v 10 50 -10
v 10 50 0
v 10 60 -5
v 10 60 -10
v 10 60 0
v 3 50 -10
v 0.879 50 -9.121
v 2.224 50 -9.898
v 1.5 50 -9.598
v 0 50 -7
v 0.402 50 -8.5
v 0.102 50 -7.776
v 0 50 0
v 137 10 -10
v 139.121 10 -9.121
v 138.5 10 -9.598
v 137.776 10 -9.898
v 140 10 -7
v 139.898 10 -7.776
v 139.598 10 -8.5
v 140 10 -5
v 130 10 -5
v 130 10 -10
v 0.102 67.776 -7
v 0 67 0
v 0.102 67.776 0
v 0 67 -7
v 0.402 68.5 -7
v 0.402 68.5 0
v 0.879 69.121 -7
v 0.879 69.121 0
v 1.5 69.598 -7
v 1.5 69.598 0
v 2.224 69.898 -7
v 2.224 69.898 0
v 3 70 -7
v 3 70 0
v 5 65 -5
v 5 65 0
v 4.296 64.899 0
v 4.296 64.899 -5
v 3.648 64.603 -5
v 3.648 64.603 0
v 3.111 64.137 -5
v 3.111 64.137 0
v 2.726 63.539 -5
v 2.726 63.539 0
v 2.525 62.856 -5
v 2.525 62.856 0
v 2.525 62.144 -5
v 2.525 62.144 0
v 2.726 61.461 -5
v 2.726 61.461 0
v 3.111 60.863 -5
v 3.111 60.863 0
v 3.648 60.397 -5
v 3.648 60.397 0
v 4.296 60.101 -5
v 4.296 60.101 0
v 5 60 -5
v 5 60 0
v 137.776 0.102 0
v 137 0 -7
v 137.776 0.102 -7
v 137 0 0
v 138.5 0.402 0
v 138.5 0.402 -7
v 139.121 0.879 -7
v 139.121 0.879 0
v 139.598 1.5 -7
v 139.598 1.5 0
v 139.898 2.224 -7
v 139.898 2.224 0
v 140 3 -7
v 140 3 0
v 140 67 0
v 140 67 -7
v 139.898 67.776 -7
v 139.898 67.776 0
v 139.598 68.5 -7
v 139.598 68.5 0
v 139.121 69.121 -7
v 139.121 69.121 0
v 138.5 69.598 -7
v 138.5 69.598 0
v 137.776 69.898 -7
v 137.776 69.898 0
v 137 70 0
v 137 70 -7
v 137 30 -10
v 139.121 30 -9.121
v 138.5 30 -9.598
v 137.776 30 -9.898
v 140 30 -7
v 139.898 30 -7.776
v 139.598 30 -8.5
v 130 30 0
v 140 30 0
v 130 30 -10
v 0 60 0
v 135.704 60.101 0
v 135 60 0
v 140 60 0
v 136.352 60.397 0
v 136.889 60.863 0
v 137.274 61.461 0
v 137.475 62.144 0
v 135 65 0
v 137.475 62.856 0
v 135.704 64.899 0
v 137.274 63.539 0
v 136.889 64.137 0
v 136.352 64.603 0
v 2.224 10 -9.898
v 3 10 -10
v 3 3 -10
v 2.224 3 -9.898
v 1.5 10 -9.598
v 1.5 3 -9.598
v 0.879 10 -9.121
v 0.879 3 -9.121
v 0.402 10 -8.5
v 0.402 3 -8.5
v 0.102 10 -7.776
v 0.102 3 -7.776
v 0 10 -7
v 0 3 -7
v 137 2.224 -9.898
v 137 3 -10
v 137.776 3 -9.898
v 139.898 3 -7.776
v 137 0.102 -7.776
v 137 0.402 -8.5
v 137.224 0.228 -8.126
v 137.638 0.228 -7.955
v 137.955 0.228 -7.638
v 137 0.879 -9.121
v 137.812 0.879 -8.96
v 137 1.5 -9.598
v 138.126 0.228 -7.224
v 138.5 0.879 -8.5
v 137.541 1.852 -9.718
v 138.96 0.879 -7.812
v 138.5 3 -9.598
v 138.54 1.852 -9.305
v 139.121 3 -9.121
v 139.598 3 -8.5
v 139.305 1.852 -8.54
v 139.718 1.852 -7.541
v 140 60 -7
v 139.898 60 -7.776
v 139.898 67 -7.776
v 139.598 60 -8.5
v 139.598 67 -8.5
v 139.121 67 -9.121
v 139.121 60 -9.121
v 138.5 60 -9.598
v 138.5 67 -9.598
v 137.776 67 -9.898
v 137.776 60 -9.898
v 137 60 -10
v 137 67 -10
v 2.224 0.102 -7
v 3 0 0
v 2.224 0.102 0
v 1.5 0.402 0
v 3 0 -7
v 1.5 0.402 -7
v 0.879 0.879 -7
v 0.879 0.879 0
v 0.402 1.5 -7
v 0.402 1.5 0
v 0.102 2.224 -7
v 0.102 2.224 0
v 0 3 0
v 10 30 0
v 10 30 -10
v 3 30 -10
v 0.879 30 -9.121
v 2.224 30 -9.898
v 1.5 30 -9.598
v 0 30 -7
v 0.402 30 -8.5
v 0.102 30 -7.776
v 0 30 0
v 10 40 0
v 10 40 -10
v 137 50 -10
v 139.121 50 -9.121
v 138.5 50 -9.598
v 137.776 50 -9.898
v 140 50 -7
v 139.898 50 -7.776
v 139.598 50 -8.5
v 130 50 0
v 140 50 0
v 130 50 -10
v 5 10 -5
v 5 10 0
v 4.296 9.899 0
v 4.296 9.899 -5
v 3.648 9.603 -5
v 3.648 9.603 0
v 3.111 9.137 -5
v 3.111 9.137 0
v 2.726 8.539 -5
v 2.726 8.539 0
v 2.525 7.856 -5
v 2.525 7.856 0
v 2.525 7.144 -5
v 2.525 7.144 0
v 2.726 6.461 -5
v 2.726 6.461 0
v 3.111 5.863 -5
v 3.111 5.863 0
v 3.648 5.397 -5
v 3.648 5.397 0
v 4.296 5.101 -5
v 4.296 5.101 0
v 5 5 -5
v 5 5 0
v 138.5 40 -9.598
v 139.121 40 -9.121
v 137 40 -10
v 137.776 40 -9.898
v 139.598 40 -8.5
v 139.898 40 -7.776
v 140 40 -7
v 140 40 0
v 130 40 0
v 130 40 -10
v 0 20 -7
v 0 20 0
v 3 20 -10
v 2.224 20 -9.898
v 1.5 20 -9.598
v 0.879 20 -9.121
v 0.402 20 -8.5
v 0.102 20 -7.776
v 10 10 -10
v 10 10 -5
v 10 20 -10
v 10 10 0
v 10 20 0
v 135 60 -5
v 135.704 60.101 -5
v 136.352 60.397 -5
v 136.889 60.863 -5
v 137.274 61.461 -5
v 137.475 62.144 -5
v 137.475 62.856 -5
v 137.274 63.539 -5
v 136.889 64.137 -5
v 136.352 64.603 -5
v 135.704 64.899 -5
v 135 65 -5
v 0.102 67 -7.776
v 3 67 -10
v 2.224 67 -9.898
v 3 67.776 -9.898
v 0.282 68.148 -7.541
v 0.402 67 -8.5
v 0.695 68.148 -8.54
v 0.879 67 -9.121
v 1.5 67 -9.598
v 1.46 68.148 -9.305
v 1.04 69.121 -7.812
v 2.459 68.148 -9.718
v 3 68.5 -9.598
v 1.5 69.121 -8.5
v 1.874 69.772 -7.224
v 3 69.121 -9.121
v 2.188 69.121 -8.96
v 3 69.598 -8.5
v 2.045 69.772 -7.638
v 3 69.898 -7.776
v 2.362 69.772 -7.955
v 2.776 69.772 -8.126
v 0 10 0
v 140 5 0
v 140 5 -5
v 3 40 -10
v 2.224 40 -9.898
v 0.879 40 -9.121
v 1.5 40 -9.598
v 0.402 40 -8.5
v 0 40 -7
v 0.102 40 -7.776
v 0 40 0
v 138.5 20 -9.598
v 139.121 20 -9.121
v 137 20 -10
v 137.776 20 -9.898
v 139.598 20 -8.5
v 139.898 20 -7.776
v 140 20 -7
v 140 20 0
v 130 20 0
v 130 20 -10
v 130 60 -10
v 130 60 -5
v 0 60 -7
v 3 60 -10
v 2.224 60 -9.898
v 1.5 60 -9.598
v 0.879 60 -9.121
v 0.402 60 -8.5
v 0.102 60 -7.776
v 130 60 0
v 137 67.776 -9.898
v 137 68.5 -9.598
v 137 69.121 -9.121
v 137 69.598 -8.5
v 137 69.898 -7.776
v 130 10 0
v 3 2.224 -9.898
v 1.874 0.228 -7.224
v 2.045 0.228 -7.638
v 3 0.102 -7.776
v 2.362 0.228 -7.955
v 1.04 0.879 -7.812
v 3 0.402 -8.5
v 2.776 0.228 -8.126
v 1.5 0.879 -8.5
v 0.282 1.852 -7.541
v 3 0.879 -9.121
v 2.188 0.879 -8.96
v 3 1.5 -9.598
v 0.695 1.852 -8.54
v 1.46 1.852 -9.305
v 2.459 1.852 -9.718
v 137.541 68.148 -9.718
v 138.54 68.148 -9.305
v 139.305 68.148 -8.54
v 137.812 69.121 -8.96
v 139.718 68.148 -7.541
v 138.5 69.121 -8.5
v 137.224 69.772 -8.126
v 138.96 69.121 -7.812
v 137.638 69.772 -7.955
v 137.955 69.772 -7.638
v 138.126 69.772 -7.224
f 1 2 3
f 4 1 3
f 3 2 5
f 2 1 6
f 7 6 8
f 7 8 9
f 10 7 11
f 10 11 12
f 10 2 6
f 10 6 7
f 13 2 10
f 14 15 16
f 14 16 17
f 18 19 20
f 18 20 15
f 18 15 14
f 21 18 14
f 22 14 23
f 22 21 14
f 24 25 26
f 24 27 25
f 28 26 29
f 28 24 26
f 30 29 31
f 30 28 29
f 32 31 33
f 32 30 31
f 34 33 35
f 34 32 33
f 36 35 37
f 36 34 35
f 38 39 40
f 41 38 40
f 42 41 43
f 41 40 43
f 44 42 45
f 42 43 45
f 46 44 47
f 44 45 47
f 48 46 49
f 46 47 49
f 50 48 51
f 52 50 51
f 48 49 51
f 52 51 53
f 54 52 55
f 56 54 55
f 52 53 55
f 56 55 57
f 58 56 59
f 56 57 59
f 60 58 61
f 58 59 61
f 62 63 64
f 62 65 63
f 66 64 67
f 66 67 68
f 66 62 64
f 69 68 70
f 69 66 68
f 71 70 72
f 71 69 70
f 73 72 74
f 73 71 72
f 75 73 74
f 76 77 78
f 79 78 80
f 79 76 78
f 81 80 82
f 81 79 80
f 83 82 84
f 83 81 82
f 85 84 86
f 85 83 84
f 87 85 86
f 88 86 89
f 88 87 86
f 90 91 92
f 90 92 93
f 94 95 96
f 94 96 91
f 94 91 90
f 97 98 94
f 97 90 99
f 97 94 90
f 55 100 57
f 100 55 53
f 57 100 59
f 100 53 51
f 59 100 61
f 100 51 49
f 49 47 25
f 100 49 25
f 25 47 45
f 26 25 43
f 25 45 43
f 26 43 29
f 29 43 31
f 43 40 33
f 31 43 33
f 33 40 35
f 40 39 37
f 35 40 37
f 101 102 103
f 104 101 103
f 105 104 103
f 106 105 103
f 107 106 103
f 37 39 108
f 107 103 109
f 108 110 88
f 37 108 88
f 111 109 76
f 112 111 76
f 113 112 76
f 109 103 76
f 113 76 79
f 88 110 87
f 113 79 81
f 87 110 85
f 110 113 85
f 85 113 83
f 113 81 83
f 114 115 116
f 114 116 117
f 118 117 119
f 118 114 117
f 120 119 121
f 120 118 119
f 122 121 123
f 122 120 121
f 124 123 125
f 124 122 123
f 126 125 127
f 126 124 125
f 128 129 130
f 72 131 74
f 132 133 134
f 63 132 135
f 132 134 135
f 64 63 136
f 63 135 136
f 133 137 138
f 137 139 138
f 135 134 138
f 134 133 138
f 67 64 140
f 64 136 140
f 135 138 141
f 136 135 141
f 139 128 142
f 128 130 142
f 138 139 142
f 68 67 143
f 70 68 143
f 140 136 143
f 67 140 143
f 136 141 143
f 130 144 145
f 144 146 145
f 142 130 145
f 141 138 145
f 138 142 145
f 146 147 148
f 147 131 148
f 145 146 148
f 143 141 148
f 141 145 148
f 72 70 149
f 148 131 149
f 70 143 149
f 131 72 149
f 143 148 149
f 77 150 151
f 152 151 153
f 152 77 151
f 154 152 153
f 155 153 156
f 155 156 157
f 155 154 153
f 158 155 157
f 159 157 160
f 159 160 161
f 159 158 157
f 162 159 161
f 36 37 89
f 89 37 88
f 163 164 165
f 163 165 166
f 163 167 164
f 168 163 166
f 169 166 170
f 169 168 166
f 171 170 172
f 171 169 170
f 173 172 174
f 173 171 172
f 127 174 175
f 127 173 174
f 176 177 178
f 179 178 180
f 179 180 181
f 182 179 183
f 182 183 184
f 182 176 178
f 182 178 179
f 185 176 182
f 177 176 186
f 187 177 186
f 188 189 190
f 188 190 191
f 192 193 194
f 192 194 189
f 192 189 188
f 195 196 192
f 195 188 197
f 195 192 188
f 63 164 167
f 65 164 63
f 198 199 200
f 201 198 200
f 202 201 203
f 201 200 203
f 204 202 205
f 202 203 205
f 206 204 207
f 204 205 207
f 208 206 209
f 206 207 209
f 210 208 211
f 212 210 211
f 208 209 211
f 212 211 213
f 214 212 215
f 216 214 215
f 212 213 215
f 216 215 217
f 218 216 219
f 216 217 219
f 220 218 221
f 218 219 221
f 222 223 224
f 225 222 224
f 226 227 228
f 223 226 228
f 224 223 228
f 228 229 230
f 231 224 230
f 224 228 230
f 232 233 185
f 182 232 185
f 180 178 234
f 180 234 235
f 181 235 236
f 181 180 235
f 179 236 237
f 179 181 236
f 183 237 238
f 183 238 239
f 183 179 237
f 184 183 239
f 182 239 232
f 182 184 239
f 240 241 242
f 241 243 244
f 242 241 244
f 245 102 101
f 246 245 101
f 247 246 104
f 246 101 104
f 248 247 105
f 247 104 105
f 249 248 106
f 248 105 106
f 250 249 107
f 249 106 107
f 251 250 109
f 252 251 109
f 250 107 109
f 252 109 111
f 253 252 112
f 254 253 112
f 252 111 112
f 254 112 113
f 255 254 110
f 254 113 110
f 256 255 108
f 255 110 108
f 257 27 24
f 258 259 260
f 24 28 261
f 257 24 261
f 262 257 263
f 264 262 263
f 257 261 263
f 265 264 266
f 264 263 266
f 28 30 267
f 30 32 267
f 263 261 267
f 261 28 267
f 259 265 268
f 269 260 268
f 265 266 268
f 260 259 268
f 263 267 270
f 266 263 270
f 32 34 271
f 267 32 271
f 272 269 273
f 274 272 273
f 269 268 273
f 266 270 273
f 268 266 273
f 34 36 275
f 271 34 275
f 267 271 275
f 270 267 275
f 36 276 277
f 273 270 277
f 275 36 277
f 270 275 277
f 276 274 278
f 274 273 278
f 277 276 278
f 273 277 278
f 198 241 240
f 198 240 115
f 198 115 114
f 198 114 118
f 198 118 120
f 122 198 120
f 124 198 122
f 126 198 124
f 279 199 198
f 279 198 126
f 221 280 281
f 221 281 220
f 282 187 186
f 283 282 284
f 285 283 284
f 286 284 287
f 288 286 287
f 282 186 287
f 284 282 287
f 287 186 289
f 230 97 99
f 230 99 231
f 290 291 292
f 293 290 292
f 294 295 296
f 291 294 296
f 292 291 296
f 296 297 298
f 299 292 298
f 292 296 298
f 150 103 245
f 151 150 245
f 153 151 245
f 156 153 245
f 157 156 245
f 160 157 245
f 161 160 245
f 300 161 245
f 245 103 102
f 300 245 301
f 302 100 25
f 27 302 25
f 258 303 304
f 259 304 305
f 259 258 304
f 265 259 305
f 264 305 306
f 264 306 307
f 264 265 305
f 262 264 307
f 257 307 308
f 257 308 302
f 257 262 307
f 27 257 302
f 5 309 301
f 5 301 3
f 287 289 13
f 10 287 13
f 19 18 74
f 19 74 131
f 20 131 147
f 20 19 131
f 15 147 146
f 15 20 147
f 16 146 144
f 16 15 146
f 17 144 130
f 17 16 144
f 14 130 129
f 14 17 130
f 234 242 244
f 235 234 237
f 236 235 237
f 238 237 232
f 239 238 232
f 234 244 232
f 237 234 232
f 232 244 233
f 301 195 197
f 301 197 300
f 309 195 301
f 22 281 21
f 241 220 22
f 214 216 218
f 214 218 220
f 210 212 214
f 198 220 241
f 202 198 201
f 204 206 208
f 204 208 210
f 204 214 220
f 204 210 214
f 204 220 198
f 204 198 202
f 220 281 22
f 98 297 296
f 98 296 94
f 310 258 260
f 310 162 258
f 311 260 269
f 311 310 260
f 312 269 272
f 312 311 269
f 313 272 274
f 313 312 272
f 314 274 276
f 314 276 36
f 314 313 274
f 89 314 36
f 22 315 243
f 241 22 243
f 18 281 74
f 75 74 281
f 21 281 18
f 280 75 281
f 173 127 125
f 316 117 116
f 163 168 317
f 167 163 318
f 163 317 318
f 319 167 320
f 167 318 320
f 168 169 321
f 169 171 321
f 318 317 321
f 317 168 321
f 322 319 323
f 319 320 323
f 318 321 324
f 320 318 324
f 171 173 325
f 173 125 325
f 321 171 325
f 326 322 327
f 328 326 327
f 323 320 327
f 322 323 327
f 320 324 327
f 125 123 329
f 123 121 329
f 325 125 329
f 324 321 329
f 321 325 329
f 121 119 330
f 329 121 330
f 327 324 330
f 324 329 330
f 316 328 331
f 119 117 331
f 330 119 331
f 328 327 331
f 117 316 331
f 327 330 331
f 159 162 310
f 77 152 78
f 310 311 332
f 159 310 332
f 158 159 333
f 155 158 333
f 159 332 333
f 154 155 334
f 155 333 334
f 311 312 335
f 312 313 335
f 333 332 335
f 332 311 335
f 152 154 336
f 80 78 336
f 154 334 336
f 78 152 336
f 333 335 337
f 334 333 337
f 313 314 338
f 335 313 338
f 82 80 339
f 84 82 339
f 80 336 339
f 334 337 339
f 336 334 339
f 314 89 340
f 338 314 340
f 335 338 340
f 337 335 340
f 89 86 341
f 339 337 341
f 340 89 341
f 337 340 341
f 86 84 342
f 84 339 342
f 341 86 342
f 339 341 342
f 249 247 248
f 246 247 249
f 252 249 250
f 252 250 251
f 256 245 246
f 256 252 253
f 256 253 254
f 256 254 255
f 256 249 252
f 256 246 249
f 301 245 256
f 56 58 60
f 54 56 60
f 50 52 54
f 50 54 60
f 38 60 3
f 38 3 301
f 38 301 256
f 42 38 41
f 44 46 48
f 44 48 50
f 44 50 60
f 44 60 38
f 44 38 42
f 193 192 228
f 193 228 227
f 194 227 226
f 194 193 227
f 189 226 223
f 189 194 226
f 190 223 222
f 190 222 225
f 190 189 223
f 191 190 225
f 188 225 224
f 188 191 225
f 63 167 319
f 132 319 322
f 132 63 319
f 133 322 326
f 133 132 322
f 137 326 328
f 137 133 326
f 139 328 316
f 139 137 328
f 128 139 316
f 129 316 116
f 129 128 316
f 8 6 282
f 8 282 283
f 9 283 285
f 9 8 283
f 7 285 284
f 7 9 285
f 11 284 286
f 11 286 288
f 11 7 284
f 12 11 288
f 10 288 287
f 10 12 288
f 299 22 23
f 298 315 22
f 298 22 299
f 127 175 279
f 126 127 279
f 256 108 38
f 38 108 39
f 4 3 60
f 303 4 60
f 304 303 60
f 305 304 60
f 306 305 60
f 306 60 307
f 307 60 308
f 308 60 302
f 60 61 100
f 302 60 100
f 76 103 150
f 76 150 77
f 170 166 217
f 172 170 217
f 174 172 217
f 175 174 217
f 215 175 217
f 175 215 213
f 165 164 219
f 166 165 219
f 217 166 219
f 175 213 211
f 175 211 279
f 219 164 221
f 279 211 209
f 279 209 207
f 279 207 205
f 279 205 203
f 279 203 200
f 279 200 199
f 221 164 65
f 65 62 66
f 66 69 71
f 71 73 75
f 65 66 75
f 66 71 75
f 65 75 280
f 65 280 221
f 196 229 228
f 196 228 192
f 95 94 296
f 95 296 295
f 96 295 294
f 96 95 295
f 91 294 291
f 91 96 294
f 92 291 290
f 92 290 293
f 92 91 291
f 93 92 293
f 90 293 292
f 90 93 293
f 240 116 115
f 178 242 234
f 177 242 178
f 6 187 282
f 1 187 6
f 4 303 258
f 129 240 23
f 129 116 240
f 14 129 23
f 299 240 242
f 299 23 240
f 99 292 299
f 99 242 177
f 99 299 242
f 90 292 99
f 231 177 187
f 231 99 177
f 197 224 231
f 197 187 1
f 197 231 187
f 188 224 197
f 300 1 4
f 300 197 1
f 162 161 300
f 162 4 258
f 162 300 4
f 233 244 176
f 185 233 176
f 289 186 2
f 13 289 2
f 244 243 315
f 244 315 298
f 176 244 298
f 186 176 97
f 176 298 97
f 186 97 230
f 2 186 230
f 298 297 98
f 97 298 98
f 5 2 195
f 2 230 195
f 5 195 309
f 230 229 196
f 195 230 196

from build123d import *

# Parameters (mm, degrees)
SKETCH_W             = 70
SKETCH_H             = 140
PAD_DEPTH            = 10
FILLET_R             = 3
FILLET001_R          = 3
SKETCH001_W          = 10
SKETCH001_H          = 10
POCKET_DEPTH         = 10.001
POCKET001_DEPTH      = 5
FILLET002_R          = 3
FILLET003_R          = 3
BODY_PLACEMENT_ANGLE = 90


with BuildPart() as part:
    # Sketch → Pad (new body)
    with BuildSketch(Plane.YZ):
        Rectangle(SKETCH_W, SKETCH_H)
    extrude(amount=PAD_DEPTH)

    # Fillet
    fillet_edges = [part.edges().sort_by_distance(p)[0] for p in [
        (10, 0, 70),
    ]]
    fillet(fillet_edges, radius=FILLET_R)

    # Fillet001
    fillet001_edges = [part.edges().sort_by_distance(p)[0] for p in [
        (10, 0, -70),
    ]]
    fillet(fillet001_edges, radius=FILLET001_R)

    # Sketch001 (on Face7 of Fillet001) → Pocket (cut, through all)
    with BuildSketch(Plane(origin=(0, 0, 0), x_dir=(0, 1, 0), z_dir=(-1, 0, 0))):
        with Locations((-20, 65)):
            Rectangle(SKETCH001_W, SKETCH001_H)
        with Locations((0, 65)):
            Rectangle(SKETCH001_W, SKETCH001_H)
        with Locations((20, 65)):
            Rectangle(SKETCH001_W, SKETCH001_H)
        with Locations((-20, -65)):
            Rectangle(SKETCH001_W, SKETCH001_H)
        with Locations((0, -65)):
            Rectangle(SKETCH001_W, SKETCH001_H)
        with Locations((20, -65)):
            Rectangle(SKETCH001_W, SKETCH001_H)
    extrude(amount=-POCKET_DEPTH, mode=Mode.SUBTRACT)

    # Sketch002 (on Face7 of Pocket) → Pocket001 (cut)
    with BuildSketch(Plane(origin=(0, 0, 0), x_dir=(0, 1, 0), z_dir=(-1, 0, 0))):
        with BuildLine():
            ThreePointArc((25, -65), (27.5, -67.5), (30, -65))
            Line((30, -65), (30, 65))
            ThreePointArc((30, 65), (27.5, 67.5), (25, 65))
            Line((25, -65), (25, 65))
        make_face()
        with BuildLine():
            ThreePointArc((-30, -70), (-27.5, -72.5), (-25, -70))
            Line((-25, -70), (-25, 65))
            ThreePointArc((-25, 65), (-27.5, 67.5), (-30, 65))
            Line((-30, -70), (-30, 65))
        make_face()
    extrude(amount=-POCKET001_DEPTH, mode=Mode.SUBTRACT)

    # Fillet002
    fillet002_edges = [part.edges().sort_by_distance(p)[0] for p in [
        (10, -35, 0),
    ]]
    fillet(fillet002_edges, radius=FILLET002_R)

    # Fillet003
    fillet003_edges = [part.edges().sort_by_distance(p)[0] for p in [
        (10, 35, 0),
    ]]
    fillet(fillet003_edges, radius=FILLET003_R)


with BuildPart() as part_1:
    # Body placement: moved
    add(part.part.rotate(Axis((0, 0, 0), (0, 1, 0)), BODY_PLACEMENT_ANGLE))


with BuildPart() as part_2:
    # Clone placement: moved
    add(part_1.part.moved(Location((70, 35, 0))))


solid = part_2.part
